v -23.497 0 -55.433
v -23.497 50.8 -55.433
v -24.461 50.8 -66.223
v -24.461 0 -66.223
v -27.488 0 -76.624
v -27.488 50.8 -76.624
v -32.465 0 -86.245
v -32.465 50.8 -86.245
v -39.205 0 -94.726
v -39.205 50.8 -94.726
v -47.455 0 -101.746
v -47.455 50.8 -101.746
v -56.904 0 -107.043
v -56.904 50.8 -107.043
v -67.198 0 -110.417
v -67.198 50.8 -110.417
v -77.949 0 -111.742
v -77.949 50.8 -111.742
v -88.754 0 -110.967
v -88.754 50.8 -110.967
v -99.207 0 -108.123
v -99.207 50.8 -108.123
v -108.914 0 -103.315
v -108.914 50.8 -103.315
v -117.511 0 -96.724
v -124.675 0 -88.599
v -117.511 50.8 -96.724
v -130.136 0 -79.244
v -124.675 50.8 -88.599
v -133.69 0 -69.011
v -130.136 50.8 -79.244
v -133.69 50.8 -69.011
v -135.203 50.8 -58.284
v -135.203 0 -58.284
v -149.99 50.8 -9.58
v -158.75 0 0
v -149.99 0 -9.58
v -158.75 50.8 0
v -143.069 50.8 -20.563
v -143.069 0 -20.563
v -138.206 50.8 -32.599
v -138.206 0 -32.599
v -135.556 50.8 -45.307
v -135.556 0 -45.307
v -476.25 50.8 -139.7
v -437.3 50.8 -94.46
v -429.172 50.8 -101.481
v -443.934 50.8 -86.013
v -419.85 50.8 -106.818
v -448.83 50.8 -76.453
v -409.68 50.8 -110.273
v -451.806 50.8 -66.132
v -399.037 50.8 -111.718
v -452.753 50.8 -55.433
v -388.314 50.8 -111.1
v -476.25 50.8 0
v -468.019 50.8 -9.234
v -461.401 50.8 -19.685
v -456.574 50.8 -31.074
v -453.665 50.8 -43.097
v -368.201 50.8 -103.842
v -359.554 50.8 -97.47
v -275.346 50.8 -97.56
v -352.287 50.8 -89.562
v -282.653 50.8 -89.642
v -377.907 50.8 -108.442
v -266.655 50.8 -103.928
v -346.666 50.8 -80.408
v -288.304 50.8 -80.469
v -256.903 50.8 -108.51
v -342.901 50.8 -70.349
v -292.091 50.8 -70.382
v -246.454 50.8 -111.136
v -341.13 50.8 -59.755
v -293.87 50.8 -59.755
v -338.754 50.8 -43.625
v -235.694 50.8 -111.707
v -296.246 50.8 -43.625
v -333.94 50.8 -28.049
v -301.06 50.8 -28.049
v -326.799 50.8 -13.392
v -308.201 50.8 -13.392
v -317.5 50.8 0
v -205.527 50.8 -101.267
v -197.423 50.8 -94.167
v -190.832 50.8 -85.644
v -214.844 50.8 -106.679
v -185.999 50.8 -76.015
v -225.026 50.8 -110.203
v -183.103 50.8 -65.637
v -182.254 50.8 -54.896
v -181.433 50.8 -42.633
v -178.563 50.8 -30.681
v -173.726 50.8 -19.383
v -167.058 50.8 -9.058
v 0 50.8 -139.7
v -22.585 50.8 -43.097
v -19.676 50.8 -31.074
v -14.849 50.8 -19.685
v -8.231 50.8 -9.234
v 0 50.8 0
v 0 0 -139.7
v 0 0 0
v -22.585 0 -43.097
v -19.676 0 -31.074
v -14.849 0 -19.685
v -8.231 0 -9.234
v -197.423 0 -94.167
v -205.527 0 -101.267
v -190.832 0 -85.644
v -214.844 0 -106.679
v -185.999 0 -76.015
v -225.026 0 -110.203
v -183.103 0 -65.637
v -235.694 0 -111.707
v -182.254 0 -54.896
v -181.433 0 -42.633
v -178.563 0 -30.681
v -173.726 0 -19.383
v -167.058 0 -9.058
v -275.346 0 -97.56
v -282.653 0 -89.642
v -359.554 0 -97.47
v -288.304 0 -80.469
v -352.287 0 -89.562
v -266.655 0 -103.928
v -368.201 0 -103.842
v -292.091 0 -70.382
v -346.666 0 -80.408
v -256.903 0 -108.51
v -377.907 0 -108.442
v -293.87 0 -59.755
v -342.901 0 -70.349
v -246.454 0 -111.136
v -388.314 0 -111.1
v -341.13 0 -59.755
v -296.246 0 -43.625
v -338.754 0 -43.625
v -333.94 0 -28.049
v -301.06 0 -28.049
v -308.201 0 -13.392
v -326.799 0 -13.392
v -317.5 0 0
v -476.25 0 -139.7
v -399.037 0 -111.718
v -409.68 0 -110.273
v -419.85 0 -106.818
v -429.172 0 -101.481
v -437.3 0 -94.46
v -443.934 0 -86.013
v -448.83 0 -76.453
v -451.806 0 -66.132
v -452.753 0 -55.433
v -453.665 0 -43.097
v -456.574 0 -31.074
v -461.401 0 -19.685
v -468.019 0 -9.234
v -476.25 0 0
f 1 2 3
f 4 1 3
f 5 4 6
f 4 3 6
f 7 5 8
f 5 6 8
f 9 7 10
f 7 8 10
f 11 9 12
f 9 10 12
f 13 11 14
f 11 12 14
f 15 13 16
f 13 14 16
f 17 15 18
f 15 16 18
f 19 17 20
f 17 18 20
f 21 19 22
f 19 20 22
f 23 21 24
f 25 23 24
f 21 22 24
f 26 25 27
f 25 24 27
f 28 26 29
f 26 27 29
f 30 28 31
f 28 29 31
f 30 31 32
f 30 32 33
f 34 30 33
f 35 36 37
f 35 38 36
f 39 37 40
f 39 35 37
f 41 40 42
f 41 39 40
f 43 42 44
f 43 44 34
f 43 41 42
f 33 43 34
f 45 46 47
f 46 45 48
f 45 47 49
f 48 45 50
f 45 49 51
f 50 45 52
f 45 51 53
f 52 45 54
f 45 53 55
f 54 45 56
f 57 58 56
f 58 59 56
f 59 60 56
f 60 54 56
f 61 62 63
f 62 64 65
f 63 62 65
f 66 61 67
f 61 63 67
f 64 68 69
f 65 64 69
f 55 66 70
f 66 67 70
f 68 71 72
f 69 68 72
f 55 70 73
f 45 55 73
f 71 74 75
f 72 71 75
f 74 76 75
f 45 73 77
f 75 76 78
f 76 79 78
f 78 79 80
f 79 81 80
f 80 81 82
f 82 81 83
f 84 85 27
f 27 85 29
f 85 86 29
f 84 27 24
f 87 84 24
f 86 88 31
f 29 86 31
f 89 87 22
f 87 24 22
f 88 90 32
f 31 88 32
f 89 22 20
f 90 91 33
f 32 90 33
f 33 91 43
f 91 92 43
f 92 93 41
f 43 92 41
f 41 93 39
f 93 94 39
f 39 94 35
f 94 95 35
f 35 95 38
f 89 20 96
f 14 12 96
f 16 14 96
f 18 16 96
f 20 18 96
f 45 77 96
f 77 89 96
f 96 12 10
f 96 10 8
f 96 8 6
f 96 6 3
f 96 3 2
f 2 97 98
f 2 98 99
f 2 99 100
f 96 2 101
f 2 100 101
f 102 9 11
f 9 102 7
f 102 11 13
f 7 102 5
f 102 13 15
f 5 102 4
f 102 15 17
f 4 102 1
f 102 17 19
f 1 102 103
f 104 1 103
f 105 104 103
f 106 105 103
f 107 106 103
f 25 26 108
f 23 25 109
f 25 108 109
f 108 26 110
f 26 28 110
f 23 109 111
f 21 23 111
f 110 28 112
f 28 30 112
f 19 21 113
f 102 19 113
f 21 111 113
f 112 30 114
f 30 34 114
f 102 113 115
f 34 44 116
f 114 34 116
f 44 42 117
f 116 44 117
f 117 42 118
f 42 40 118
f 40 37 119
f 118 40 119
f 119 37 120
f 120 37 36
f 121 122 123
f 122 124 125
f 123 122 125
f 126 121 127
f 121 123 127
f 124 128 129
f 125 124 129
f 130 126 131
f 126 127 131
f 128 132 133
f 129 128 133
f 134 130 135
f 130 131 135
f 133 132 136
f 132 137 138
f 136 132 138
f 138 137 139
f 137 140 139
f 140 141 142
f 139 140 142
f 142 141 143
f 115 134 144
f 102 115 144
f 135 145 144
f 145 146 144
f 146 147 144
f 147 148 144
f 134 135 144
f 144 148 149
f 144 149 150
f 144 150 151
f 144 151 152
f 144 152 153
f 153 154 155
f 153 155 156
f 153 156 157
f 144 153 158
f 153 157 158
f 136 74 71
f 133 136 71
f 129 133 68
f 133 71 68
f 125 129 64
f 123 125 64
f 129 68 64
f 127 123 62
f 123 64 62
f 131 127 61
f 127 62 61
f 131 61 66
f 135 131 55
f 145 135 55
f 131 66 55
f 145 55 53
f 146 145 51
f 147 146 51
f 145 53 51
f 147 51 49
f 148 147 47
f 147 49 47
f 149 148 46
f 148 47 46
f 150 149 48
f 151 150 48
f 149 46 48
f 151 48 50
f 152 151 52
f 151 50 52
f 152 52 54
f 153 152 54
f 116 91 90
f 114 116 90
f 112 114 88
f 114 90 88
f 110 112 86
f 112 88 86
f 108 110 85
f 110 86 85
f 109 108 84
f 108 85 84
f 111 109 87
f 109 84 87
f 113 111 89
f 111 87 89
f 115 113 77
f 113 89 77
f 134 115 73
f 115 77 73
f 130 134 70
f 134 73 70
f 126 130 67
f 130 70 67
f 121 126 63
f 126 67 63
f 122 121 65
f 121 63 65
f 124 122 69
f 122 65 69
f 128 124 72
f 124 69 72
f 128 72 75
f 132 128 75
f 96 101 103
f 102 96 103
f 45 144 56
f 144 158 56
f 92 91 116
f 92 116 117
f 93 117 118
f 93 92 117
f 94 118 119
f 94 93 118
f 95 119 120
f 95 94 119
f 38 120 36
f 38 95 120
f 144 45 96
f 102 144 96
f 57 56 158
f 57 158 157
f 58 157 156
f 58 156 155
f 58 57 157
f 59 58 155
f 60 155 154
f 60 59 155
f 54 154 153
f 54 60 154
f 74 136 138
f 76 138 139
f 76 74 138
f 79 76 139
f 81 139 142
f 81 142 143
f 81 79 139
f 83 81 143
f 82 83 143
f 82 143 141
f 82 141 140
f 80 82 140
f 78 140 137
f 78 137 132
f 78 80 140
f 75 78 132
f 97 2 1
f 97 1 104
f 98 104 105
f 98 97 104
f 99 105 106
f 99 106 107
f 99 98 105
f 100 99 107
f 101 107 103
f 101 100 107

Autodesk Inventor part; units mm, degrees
ref_plane "YZ Plane" through (0, 0, 0) normal (1, 0, 0) x (0, 1, 0)
ref_plane "XZ Plane" through (0, 0, 0) normal (0, 1, 0) x (-1, 0, 0)
ref_plane "XY Plane" through (0, 0, 0) normal (0, 0, 1) x (1, 0, 0)
sketch "Sketch1" plane through (0, 0, 0) normal (0, 0, 1) x (1, 0, 0)
  line L0 (0, 0) -> (-476.25, 0)
  line L1 (-476.25, 0) -> (-476.25, 50.8)
  line L2 (-476.25, 50.8) -> (0, 50.8)
  line L3 (0, 50.8) -> (0, 0)
  dimension "d5" = 50.8
  dimension "d6" = 476.25
extrude "Extrusion1" add sketch "Sketch1" against normal blind 139.7
sketch "Sketch2" plane through (-476.25, 50.8, 0) normal (0, 1, 0) x (1, 0, 0)
  line L0 (0, 0) -> (476.25, 0) projected
  circle A0 centre (396.875, 55.88) radius 55.88
  arc A1 (452.7532, 55.4333) -> (476.25, 0) centre (528.4627, 54.8281) ccw
  line L1 (476.25, 139.7) -> (0, 139.7) projected
  line L2 (476.25, 0) -> (476.25, 139.7) projected
  line L3 (158.75, 139.7) -> (158.75, 0)
  line L4 (317.5, 139.7) -> (317.5, 0)
  circle A2 centre (238.125, 55.88) radius 55.88
  circle A3 centre (79.375, 55.88) radius 55.88
  arc A4 (317.5, 0) -> (341.0467, 58.2841) centre (268.3126, 53.7701) ccw
  arc A5 (135.1205, 59.7553) -> (158.75, 0) centre (241.1273, 67.1248) ccw
  arc A6 (0, 0) -> (23.4968, 55.4333) centre (-52.2127, 54.8281) ccw
  arc A7 (158.75, 0) -> (182.3795, 59.7553) centre (76.3727, 67.1248) ccw
  arc A8 (293.9963, 54.8959) -> (317.5, 0) centre (366.8591, 53.6126) ccw
  dimension "d9" = 111.76
  dimension "d10" = 55.88
  dimension "d11" = 79.375
  dimension "d14" = 158.75
  dimension "d15" = 158.75
  dimension "d16" = 79.375
  dimension "d17" = 79.375
extrude "Extrusion3" cut sketch "Sketch2" against normal blind 139.7 contours A6 A3 L0 | A7 A2 L0 | A3 A5 L0 | A3 | A2 A8 L0 | A2 | A4 A0 L0 | A0 A1 L0 | A0 A4 picked at (415.2449, 59.3205)
properties part number "swirvy for illustrator"
